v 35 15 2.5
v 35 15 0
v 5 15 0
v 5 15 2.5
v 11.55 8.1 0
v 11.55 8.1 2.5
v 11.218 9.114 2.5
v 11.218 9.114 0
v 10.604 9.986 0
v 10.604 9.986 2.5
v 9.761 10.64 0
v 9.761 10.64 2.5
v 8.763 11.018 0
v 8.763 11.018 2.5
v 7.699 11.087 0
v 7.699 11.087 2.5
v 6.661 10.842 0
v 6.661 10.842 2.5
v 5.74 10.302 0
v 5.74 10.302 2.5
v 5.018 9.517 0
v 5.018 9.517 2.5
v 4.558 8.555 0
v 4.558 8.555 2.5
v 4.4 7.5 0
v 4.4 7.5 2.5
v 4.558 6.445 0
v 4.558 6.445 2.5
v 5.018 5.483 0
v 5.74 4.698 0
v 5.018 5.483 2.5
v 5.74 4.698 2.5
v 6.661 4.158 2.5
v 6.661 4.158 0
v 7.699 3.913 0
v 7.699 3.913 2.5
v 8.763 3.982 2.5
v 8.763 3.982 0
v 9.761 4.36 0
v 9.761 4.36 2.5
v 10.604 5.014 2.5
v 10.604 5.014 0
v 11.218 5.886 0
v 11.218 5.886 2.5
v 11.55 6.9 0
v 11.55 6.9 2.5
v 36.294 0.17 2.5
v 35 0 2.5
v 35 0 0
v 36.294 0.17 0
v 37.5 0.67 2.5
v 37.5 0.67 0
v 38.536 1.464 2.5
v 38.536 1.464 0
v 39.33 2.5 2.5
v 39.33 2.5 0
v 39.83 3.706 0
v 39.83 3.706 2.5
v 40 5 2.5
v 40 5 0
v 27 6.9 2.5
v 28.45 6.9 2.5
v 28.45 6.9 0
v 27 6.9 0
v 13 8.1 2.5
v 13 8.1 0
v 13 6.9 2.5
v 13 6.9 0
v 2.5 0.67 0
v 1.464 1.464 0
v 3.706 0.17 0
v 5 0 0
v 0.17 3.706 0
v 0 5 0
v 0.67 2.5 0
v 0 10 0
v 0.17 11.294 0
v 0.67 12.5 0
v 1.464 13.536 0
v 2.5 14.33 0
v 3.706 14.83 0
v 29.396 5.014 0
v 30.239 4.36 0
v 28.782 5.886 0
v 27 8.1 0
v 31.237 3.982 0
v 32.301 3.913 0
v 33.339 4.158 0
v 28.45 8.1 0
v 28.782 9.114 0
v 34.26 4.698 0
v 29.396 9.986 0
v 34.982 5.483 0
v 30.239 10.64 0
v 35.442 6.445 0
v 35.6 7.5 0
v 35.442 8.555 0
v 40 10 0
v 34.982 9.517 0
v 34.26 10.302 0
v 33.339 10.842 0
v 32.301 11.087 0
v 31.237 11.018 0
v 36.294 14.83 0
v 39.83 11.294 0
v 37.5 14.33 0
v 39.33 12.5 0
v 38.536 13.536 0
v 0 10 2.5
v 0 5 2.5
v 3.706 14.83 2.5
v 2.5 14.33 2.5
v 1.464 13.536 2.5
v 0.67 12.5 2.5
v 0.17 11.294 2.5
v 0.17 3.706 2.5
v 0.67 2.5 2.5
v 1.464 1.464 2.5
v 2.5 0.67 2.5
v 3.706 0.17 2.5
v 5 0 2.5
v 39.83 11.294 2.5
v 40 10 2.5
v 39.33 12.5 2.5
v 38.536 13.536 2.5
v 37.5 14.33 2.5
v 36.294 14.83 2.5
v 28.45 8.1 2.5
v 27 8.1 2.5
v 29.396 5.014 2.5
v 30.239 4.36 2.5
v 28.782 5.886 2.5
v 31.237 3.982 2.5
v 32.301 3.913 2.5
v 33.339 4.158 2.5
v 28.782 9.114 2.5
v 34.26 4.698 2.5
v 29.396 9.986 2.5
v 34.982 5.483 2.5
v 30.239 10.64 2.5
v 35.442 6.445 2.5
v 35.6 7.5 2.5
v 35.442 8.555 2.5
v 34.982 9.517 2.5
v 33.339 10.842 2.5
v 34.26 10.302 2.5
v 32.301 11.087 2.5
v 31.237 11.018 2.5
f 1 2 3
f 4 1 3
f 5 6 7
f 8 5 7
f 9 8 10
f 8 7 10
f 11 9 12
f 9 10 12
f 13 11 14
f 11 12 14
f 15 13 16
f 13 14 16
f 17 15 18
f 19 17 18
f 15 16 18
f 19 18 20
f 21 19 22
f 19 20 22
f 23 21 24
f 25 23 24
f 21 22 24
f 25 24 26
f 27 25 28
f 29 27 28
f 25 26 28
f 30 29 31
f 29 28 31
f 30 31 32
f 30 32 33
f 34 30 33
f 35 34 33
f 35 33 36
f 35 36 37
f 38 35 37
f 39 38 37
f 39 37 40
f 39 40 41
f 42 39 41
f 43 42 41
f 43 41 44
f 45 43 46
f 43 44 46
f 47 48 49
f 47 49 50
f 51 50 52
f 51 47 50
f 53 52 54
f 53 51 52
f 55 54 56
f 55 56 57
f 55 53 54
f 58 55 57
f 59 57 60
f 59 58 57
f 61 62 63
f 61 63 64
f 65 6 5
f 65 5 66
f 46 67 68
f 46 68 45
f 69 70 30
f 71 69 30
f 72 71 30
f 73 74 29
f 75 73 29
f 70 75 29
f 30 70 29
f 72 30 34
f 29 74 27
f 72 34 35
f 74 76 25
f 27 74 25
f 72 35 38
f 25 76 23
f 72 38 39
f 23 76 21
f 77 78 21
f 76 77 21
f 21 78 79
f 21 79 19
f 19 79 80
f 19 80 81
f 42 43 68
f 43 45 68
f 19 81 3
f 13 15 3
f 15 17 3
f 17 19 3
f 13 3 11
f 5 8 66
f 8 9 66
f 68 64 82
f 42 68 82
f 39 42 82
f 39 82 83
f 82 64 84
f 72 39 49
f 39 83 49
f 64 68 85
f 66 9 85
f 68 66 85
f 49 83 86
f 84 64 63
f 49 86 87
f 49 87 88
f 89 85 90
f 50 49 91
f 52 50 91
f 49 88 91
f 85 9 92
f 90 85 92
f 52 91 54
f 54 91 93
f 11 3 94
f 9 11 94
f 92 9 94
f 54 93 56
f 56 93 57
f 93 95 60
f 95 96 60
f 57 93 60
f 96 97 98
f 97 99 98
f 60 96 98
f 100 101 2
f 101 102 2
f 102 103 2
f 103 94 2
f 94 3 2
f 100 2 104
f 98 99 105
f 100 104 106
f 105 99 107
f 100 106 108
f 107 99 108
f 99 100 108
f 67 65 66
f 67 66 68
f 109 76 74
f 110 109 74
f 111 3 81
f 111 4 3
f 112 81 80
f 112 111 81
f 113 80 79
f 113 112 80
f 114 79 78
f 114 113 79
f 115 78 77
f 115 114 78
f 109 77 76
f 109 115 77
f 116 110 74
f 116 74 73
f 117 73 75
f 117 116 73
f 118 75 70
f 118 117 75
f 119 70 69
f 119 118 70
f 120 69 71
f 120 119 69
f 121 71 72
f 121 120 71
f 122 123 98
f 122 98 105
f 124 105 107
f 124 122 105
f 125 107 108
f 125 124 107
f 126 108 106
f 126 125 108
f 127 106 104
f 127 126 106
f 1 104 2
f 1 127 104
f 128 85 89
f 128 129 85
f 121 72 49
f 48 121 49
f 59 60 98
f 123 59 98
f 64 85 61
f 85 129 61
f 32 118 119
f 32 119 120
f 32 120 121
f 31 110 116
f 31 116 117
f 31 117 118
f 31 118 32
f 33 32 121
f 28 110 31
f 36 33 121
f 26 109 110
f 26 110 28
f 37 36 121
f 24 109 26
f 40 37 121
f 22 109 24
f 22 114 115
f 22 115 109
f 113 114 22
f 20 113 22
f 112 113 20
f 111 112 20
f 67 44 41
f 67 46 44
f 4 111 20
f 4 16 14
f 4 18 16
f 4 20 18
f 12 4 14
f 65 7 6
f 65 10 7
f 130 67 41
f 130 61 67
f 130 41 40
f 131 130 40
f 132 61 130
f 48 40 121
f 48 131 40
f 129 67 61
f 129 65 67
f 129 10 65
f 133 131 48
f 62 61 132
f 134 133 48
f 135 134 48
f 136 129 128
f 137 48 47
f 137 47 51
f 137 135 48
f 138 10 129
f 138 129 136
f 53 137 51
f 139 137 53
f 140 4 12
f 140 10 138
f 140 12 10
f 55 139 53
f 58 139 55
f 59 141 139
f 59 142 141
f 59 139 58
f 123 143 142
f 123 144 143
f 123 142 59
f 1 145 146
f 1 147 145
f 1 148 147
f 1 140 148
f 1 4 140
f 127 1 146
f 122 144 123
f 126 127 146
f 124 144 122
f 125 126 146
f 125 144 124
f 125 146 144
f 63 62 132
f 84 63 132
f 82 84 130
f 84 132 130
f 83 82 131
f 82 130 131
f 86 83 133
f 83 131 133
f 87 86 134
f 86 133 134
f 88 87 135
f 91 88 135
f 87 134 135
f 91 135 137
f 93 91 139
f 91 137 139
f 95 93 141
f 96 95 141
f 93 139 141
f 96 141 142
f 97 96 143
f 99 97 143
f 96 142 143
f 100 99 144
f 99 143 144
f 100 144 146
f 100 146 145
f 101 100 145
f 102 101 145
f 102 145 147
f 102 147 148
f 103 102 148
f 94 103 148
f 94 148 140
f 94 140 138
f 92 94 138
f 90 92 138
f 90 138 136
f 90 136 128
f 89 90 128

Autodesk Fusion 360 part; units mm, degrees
sketch "Sketch1" plane through (0, 0, 0) normal (0, 0, 1) x (1, 0, 0)
  line L0 (0, 0) -> (40, 0)
  line L1 (40, 0) -> (40, 15)
  line L2 (40, 15) -> (0, 15)
  line L3 (0, 15) -> (0, 0)
  dimension "d1" = 40
  dimension "d2" = 15
extrude "Extrude1" add sketch "Sketch1" along normal blind 2.5
sketch "Sketch2" plane through (0, 0, 2.5) normal (0, 0, 1) x (-1, 0, 0)
  line L0 (0, -15) -> (0, 0)
  line L1 (0, 0) -> (-40, 0)
  line L2 (-40, 0) -> (-40, -15)
  line L3 (-40, -15) -> (0, -15)
  line L4 (-20, -20) -> (-20, 7) construction
  line L5 (-32, -20) -> (-32, 13) construction
  line L6 (-8, -20) -> (-8, 12) construction
  line L7 (2.5927, -7.5) -> (-48, -7.5) construction
  line L8 (-13, -8.1) -> (-13, -6.9)
  line L9 (-27, -8.1) -> (-27, -6.9)
  arc A0 (-11.5496, -8.1) -> (-11.5496, -6.9) centre (-8, -7.5) ccw
  line L10 (-28.4504, -6.9) -> (-27, -6.9)
  line L11 (-13, -6.9) -> (-11.5496, -6.9)
  line L12 (-11.5496, -8.1) -> (-13, -8.1)
  line L13 (-27, -8.1) -> (-28.4504, -8.1)
  arc A1 (-28.4504, -6.9) -> (-28.4504, -8.1) centre (-32, -7.5) ccw
  dimension "d5" = 20
  dimension "d6" = 12
  dimension "d7" = 12
  dimension "d8" = 7.5
  dimension "d9" = 7.2
  dimension "d10" = 7.2
  dimension "d12" = 0.6
  dimension "d13" = 5
  dimension "d14" = 5
extrude "Extrude2" cut sketch "Sketch2" against normal blind 4 contours L8 A0 L11 L12 | L9 L10 L13 A1
fillet "Fillet1" radius 5 1 edges at (0, 0, 1.25)
fillet "Fillet2" radius 5 2 edges at (40, 0, 1.25) (40, 15, 1.25)
fillet "Fillet3" radius 5 1 edges at (0, 15, 1.25)
